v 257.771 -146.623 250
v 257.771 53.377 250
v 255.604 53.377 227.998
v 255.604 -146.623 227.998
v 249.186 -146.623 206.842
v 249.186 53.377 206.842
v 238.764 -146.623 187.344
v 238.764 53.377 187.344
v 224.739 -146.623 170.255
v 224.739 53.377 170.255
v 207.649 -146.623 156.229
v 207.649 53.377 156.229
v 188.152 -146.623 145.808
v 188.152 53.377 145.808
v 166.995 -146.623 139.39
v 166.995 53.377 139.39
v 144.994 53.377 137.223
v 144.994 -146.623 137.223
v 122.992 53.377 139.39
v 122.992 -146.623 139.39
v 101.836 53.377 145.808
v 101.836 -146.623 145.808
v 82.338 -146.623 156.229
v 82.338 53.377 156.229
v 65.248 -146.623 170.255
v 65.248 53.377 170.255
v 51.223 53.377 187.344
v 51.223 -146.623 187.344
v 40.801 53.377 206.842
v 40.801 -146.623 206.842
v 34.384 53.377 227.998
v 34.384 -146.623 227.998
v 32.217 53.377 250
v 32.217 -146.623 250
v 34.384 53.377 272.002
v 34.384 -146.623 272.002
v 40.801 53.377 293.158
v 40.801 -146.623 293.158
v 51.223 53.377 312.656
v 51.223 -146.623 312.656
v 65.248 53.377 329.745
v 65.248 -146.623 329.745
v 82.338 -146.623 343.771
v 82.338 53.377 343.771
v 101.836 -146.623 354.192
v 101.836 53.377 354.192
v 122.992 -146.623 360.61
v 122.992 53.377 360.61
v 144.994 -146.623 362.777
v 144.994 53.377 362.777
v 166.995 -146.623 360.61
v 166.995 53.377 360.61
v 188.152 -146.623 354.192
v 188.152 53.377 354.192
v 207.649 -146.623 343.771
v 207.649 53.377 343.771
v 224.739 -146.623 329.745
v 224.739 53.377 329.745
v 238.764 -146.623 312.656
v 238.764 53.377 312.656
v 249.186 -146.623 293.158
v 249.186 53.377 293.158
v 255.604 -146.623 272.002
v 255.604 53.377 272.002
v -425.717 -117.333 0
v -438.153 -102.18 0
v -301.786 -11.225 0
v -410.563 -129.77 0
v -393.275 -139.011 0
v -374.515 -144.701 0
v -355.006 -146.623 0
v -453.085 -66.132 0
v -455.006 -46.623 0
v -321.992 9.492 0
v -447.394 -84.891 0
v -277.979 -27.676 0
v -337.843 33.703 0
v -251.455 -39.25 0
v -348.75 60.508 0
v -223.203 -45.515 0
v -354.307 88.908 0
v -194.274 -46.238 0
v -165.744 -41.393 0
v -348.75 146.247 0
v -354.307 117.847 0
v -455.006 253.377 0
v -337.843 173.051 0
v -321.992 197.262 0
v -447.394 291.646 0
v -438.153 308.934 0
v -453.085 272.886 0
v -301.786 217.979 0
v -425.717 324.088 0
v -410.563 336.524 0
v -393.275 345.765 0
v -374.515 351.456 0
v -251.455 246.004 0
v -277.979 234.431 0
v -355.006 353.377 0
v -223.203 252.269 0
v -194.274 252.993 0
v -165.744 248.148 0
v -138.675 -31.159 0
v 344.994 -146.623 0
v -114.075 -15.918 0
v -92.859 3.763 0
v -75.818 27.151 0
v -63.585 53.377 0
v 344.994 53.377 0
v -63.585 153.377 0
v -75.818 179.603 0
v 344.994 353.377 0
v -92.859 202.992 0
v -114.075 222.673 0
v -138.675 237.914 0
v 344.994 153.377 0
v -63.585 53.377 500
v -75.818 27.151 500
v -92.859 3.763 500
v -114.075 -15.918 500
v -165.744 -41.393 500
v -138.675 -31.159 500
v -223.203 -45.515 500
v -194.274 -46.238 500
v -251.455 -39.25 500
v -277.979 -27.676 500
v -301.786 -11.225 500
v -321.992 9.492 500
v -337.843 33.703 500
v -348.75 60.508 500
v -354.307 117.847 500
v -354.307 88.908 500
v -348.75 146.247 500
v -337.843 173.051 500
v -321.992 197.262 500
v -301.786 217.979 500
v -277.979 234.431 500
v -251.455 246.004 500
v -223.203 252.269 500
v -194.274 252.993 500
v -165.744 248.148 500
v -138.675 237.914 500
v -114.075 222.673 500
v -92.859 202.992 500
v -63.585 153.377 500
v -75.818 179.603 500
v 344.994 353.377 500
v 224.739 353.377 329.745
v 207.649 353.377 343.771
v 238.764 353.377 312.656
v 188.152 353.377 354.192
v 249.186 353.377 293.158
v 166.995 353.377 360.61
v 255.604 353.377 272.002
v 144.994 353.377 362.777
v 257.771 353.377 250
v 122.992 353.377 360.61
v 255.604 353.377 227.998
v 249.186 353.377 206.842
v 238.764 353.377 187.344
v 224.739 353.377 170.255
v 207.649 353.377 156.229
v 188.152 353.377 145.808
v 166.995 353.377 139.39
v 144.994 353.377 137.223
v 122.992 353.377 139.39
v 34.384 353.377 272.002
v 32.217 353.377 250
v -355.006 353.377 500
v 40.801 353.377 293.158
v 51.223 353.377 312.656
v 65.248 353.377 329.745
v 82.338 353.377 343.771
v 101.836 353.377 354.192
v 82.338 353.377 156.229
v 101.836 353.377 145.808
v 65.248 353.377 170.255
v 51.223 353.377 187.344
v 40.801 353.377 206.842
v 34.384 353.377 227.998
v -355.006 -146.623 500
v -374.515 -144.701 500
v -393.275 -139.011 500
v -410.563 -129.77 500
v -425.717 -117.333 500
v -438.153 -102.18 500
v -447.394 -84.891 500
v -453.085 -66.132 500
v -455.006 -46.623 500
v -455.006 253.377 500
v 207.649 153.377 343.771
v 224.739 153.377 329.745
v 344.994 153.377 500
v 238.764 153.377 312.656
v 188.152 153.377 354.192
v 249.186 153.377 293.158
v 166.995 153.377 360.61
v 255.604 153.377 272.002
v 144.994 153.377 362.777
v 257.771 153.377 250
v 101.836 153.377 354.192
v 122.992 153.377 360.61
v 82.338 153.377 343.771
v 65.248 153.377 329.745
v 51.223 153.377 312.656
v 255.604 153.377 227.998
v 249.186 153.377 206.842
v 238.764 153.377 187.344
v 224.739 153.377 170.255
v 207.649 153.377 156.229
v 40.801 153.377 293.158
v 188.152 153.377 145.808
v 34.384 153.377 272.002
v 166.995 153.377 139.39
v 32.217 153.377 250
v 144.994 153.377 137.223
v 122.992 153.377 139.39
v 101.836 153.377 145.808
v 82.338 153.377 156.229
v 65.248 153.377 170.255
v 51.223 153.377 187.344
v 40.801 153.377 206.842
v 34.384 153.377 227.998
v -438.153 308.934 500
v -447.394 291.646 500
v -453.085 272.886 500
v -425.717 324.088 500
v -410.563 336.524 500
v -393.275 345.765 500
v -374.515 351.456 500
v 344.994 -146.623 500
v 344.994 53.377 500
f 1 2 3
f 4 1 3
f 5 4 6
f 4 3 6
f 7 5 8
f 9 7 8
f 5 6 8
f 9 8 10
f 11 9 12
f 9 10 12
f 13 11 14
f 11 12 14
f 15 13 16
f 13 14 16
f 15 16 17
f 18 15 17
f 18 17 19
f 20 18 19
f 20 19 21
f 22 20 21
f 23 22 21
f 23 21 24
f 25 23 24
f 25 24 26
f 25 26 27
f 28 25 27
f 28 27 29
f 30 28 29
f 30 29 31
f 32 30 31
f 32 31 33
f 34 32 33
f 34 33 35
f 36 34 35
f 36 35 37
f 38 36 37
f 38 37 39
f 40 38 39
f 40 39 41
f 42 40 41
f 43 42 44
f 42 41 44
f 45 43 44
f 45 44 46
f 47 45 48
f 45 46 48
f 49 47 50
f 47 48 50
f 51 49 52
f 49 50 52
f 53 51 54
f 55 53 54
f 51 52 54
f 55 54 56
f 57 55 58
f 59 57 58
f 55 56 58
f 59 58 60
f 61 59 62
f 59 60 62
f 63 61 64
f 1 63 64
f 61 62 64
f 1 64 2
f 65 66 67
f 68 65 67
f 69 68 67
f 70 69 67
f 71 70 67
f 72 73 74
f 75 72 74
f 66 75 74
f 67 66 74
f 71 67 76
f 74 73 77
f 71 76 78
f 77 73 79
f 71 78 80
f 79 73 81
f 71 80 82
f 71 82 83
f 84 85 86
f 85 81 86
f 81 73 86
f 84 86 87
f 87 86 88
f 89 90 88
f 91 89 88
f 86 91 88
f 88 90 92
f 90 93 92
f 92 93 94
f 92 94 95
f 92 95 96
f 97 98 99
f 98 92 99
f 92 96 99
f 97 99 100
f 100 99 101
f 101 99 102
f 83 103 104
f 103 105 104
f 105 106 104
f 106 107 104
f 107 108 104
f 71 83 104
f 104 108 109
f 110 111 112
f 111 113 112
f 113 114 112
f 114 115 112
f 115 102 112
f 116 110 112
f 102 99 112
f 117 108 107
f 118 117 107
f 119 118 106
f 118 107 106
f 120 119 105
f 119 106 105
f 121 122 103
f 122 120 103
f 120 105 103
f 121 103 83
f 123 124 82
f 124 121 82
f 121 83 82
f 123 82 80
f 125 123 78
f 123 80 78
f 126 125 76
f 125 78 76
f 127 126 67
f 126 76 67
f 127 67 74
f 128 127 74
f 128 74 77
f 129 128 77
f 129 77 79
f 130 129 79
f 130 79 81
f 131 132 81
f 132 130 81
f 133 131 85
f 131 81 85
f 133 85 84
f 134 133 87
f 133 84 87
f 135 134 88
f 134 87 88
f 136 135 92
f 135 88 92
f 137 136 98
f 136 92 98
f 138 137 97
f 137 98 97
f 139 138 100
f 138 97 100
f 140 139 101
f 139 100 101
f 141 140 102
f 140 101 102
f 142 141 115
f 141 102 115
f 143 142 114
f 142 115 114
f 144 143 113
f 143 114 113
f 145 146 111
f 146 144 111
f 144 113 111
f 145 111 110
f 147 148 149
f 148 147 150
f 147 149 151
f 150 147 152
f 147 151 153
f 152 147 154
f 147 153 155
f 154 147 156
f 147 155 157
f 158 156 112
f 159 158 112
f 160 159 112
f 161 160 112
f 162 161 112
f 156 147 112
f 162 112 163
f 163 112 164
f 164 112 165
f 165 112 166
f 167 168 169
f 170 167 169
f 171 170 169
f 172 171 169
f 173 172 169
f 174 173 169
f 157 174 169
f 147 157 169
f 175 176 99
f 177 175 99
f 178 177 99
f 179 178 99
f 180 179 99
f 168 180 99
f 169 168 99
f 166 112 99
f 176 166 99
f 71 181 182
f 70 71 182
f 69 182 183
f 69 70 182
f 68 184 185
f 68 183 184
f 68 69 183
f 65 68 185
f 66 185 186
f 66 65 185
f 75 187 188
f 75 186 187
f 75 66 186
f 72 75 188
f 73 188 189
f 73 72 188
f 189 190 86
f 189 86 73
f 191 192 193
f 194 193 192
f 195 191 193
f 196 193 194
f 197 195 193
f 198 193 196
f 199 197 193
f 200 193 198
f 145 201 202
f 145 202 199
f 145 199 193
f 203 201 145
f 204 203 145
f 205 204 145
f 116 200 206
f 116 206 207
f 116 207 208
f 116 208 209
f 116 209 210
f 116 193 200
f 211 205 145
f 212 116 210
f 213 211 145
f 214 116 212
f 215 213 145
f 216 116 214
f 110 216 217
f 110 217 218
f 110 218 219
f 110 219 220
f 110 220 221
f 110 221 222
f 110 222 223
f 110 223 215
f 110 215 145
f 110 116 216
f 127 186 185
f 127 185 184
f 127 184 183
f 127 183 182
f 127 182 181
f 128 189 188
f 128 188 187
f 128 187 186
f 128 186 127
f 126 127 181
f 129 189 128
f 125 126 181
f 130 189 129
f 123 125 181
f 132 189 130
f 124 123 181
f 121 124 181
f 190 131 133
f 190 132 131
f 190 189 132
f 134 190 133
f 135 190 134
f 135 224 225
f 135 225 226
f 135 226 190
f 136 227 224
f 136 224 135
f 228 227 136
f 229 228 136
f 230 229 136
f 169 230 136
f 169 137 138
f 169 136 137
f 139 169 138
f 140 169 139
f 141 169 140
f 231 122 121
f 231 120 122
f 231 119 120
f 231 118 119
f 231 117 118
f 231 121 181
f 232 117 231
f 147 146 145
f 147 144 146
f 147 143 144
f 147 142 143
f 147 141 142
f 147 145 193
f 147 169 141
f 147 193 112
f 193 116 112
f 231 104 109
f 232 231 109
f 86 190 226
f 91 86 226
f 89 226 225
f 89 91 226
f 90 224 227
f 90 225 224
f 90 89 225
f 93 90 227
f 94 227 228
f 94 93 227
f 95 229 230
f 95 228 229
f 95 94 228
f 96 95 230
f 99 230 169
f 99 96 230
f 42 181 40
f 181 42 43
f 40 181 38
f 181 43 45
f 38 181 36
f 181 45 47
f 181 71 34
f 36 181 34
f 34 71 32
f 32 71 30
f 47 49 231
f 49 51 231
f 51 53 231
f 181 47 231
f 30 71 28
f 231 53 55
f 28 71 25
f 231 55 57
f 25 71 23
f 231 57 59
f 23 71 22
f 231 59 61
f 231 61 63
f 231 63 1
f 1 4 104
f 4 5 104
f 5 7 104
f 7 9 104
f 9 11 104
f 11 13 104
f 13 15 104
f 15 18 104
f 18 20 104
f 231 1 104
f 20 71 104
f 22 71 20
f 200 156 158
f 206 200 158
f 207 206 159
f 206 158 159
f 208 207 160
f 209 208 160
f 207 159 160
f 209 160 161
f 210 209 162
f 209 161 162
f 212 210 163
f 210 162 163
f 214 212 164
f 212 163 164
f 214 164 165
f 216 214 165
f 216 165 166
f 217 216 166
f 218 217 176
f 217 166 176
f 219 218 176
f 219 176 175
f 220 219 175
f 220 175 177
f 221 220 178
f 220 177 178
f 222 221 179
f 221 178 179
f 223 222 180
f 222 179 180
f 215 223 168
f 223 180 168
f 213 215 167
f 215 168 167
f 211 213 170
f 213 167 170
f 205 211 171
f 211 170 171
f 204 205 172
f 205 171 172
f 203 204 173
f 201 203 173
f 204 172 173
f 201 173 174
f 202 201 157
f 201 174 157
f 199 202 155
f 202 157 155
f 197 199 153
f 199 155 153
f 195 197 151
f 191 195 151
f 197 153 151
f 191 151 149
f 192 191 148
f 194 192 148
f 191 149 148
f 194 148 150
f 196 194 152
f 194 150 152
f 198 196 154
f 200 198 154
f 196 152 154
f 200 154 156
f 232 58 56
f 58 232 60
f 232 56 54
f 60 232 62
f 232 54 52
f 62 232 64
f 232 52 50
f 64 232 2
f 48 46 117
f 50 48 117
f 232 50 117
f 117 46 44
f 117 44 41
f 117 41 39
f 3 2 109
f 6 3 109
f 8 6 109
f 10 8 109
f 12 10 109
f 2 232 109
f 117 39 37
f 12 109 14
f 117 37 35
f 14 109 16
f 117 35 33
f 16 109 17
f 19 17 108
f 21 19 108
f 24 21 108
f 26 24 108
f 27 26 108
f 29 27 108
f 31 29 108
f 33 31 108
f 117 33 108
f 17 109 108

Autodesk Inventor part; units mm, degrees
ref_plane "YZ Plane" through (0, 0, 0) normal (1, 0, 0) x (0, 1, 0)
ref_plane "XZ Plane" through (0, 0, 0) normal (0, 1, 0) x (-1, 0, 0)
ref_plane "XY Plane" through (0, 0, 0) normal (0, 0, 1) x (1, 0, 0)
sketch "Sketch1" plane through (0, 0, 0) normal (0, 0, 1) x (1, 0, 0)
  line L0 (344.9937, 353.3773) -> (-355.0063, 353.3773)
  line L1 (-455.0063, 253.3773) -> (-455.0063, -46.6227)
  line L2 (-355.0063, -146.6227) -> (344.9937, -146.6227)
  line L3 (344.9937, -146.6227) -> (344.9937, 53.3773)
  line L4 (344.9937, 153.3773) -> (344.9937, 353.3773)
  arc A0 (-63.585, 153.3773) -> (-63.585, 53.3773) centre (-205.0063, 103.3773) ccw
  line L5 (344.9937, 153.3773) -> (-63.585, 153.3773)
  line L6 (344.9937, 53.3773) -> (-63.585, 53.3773)
  arc A1 (-355.0063, 353.3773) -> (-455.0063, 253.3773) centre (-355.0063, 253.3773) ccw
  arc A2 (-455.0063, -46.6227) -> (-355.0063, -146.6227) centre (-355.0063, -46.6227) ccw
  point P0 (0, 0)
  point P1 (-455.0063, 353.3773)
  point P2 (-455.0063, -146.6227)
  dimension "d0" = 800
  dimension "d1" = 500
  dimension "d8" = 250
  dimension "d9" = 300
  dimension "d10" = 100
  dimension "d11" = 100
  dimension "d12" = 200
  dimension "d13" = 200
extrude "Extrusion1" add sketch "Sketch1" along normal blind 500
sketch "Sketch2" plane through (-355.0063, 353.3773, 0) normal (0, 1, 0) x (1, 0, 0)
  circle A0 centre (500, -250) radius 112.7771
  line L0 (700, -500) -> (0, -500) projected
  line L1 (700, 0) -> (700, -500) projected
  point P0 (355.0063, 0)
  dimension "d16" = 250
  dimension "d17" = 200
extrude "Extrusion2" cut sketch "Sketch2" against normal blind 700
properties part number "BT15_Klemme"
